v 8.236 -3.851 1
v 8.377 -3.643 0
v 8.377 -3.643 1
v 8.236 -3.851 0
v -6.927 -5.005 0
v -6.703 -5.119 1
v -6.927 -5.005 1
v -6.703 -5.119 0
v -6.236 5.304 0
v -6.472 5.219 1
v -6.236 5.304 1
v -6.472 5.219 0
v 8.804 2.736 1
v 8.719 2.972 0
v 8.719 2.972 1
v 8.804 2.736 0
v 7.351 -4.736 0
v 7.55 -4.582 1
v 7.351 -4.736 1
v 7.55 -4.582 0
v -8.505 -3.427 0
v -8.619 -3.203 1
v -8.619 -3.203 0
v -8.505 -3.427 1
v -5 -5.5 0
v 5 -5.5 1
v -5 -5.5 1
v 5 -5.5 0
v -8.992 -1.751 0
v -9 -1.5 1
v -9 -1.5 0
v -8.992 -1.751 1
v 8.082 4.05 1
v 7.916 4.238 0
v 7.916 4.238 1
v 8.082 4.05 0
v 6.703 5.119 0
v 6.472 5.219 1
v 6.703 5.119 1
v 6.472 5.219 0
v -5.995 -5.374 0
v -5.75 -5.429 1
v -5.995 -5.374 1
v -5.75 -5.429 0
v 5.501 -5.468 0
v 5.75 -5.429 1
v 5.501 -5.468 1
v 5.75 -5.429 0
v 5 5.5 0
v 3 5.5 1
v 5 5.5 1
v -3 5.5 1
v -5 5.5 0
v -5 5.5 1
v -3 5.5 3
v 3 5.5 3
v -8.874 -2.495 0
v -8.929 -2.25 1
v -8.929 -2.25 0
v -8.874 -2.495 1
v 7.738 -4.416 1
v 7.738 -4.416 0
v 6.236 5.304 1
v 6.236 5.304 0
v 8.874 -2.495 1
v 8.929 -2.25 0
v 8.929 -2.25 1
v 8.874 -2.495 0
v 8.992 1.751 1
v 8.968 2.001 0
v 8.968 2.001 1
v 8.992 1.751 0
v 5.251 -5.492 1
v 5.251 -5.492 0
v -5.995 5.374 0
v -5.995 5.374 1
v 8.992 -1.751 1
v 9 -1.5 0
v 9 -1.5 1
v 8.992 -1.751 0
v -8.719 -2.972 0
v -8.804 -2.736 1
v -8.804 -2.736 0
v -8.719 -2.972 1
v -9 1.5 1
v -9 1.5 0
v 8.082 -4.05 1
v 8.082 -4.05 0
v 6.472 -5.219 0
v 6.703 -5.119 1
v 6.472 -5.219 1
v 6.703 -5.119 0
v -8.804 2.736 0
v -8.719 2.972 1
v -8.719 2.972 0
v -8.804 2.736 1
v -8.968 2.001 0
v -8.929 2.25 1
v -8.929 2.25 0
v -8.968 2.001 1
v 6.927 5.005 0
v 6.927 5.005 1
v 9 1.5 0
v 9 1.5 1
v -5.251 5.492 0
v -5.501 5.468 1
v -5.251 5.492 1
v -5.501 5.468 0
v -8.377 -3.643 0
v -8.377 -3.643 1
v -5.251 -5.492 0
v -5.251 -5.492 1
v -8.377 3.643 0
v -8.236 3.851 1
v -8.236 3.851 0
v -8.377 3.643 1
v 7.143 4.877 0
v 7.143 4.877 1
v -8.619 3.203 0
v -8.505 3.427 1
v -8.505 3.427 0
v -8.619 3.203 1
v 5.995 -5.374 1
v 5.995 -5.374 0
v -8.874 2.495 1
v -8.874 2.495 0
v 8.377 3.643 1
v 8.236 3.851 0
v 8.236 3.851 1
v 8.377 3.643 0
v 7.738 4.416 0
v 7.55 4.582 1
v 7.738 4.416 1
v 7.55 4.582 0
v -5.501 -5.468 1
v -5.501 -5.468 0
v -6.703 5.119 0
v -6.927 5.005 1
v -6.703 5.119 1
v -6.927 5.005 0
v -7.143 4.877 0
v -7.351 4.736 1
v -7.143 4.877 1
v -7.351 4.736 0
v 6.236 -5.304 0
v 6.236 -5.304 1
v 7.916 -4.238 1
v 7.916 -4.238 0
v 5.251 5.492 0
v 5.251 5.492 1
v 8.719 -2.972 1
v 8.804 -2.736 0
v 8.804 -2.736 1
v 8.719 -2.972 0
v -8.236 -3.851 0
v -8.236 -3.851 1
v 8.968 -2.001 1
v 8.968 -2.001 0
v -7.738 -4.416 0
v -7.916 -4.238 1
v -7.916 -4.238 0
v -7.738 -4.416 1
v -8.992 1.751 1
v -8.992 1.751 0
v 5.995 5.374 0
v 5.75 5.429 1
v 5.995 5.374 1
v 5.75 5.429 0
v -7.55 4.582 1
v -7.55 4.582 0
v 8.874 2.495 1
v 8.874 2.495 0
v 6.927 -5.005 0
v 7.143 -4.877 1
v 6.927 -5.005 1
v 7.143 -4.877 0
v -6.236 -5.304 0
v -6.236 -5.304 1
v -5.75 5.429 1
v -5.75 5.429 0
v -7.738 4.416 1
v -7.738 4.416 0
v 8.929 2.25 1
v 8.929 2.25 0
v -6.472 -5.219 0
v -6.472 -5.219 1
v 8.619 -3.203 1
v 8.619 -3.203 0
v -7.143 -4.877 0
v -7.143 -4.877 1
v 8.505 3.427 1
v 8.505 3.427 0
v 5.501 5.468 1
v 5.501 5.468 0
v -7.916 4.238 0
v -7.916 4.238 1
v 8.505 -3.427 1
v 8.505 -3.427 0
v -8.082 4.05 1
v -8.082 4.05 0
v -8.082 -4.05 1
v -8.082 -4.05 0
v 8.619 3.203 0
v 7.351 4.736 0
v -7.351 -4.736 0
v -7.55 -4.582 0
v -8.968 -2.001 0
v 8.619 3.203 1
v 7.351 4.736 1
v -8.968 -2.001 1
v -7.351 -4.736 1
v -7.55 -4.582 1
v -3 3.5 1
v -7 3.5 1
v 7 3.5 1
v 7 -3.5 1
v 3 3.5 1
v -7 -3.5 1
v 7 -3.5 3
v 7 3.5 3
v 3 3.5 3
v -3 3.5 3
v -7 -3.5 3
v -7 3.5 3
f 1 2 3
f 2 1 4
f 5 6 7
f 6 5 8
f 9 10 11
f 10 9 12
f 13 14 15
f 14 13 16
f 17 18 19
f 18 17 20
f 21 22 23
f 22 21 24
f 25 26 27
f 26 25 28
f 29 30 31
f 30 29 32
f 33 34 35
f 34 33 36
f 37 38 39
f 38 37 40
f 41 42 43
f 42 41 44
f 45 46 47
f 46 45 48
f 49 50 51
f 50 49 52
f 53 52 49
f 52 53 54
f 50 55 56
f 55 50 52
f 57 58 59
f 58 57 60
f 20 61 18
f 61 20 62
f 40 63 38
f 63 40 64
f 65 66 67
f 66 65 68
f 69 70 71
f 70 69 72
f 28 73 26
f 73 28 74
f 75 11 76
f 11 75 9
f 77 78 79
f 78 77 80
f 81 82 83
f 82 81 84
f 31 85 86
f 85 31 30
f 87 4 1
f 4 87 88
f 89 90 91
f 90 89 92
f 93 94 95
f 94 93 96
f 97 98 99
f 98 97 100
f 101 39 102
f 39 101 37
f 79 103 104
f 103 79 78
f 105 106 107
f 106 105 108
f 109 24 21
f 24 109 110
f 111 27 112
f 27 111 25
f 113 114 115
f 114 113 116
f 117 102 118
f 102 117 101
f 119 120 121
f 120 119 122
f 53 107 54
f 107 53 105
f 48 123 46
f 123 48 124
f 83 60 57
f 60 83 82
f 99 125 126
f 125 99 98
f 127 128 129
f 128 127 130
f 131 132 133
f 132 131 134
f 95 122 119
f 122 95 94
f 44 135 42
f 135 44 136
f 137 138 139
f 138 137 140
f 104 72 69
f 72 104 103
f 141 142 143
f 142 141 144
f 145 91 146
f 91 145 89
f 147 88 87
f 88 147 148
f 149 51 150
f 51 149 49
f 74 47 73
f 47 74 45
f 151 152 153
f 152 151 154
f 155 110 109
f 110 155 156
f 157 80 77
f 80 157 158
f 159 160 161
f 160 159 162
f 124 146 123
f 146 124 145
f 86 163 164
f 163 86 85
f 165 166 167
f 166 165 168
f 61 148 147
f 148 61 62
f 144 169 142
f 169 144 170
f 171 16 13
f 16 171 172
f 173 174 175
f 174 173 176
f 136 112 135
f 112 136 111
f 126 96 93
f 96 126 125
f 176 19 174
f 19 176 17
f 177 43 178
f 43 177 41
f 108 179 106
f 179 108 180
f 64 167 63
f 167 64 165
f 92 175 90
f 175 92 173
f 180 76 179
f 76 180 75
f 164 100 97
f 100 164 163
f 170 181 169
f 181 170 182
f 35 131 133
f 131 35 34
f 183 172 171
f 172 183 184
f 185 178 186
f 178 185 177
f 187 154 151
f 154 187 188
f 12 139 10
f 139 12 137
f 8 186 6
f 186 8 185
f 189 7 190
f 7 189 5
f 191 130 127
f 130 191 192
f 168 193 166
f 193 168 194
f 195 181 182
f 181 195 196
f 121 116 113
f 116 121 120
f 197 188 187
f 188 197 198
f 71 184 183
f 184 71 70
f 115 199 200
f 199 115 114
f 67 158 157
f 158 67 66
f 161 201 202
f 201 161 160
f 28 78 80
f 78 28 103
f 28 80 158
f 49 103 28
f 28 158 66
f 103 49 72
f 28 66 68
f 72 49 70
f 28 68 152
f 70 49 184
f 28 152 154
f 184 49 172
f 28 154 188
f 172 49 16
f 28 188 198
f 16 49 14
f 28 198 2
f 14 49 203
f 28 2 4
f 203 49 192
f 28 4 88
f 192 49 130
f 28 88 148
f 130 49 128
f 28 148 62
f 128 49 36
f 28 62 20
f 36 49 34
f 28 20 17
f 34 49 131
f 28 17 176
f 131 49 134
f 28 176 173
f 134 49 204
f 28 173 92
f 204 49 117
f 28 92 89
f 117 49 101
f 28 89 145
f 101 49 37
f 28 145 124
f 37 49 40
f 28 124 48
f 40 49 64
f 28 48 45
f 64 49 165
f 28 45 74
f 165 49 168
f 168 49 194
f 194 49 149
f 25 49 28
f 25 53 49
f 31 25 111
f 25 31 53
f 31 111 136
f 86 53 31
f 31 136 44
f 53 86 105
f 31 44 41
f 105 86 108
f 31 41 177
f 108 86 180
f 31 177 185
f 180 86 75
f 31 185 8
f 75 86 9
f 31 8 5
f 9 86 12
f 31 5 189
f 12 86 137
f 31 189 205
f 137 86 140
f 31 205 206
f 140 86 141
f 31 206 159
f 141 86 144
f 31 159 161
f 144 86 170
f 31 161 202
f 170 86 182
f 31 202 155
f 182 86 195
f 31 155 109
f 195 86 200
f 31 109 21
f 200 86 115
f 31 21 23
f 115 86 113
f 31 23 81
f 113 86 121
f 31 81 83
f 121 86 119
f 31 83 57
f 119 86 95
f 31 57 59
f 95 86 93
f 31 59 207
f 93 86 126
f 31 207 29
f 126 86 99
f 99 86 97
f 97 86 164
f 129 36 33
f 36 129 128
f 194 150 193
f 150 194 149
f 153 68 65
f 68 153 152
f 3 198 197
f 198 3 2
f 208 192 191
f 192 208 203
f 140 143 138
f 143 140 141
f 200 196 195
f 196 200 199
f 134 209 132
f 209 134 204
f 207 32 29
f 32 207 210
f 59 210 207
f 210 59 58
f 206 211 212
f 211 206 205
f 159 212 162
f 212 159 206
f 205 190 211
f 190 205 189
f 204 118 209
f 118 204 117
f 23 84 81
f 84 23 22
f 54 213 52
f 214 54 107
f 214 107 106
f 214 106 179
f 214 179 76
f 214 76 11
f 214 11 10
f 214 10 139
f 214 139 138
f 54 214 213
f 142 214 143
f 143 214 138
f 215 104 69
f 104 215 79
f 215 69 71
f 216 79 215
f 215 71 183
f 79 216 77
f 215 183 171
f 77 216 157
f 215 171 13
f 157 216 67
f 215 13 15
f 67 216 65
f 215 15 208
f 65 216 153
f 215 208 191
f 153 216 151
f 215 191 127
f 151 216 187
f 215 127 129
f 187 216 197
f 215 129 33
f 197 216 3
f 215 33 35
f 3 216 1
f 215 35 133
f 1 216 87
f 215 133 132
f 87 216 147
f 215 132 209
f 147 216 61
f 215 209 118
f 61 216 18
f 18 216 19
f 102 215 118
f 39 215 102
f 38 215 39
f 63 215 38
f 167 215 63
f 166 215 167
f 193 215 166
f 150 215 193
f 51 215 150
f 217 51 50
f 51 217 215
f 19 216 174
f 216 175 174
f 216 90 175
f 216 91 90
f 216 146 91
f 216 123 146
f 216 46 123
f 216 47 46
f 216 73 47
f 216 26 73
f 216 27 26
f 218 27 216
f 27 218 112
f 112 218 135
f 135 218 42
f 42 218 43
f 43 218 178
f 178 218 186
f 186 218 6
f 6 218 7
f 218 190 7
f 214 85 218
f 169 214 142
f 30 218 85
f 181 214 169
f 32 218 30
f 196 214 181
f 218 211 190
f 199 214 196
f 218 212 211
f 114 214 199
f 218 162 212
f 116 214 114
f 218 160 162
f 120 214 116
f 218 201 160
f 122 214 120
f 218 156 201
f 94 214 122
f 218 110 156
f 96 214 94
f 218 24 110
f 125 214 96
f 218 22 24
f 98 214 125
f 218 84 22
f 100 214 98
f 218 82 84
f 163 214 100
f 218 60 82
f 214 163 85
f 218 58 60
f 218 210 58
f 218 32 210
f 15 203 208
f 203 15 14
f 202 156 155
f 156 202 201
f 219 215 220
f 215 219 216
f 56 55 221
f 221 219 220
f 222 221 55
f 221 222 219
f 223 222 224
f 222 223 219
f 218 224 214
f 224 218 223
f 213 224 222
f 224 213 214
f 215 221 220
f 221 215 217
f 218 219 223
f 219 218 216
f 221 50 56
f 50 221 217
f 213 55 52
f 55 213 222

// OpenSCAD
/**
 * Martin Egli
 * 2021-03-24
 */
res = 100;

module plate(w1 = 18, h2 = 11, r1 = 4) {
    hull() {
        translate([-(w1/2-4), -(11/2-4), 0])
        cylinder(r = r1, h = 1, $fn = res);
        translate([+(w1/2-4), -(11/2-4), 0])
        cylinder(r = r1, h = 1, $fn = res);
        translate([+(w1/2-4), +(11/2-4), 0])
        cylinder(r = r1, h = 1, $fn = res);
        translate([-(w1/2-4), +(11/2-4), 0])
        cylinder(r = r1, h = 1, $fn = res);
    }
    translate([-(18-4)/2, -(11-4)/2, 1])
    cube([18-4, 11-4, 2]);
    translate([-3, 3.5, 1])
    cube([6, 2, 2]);
}

plate();
